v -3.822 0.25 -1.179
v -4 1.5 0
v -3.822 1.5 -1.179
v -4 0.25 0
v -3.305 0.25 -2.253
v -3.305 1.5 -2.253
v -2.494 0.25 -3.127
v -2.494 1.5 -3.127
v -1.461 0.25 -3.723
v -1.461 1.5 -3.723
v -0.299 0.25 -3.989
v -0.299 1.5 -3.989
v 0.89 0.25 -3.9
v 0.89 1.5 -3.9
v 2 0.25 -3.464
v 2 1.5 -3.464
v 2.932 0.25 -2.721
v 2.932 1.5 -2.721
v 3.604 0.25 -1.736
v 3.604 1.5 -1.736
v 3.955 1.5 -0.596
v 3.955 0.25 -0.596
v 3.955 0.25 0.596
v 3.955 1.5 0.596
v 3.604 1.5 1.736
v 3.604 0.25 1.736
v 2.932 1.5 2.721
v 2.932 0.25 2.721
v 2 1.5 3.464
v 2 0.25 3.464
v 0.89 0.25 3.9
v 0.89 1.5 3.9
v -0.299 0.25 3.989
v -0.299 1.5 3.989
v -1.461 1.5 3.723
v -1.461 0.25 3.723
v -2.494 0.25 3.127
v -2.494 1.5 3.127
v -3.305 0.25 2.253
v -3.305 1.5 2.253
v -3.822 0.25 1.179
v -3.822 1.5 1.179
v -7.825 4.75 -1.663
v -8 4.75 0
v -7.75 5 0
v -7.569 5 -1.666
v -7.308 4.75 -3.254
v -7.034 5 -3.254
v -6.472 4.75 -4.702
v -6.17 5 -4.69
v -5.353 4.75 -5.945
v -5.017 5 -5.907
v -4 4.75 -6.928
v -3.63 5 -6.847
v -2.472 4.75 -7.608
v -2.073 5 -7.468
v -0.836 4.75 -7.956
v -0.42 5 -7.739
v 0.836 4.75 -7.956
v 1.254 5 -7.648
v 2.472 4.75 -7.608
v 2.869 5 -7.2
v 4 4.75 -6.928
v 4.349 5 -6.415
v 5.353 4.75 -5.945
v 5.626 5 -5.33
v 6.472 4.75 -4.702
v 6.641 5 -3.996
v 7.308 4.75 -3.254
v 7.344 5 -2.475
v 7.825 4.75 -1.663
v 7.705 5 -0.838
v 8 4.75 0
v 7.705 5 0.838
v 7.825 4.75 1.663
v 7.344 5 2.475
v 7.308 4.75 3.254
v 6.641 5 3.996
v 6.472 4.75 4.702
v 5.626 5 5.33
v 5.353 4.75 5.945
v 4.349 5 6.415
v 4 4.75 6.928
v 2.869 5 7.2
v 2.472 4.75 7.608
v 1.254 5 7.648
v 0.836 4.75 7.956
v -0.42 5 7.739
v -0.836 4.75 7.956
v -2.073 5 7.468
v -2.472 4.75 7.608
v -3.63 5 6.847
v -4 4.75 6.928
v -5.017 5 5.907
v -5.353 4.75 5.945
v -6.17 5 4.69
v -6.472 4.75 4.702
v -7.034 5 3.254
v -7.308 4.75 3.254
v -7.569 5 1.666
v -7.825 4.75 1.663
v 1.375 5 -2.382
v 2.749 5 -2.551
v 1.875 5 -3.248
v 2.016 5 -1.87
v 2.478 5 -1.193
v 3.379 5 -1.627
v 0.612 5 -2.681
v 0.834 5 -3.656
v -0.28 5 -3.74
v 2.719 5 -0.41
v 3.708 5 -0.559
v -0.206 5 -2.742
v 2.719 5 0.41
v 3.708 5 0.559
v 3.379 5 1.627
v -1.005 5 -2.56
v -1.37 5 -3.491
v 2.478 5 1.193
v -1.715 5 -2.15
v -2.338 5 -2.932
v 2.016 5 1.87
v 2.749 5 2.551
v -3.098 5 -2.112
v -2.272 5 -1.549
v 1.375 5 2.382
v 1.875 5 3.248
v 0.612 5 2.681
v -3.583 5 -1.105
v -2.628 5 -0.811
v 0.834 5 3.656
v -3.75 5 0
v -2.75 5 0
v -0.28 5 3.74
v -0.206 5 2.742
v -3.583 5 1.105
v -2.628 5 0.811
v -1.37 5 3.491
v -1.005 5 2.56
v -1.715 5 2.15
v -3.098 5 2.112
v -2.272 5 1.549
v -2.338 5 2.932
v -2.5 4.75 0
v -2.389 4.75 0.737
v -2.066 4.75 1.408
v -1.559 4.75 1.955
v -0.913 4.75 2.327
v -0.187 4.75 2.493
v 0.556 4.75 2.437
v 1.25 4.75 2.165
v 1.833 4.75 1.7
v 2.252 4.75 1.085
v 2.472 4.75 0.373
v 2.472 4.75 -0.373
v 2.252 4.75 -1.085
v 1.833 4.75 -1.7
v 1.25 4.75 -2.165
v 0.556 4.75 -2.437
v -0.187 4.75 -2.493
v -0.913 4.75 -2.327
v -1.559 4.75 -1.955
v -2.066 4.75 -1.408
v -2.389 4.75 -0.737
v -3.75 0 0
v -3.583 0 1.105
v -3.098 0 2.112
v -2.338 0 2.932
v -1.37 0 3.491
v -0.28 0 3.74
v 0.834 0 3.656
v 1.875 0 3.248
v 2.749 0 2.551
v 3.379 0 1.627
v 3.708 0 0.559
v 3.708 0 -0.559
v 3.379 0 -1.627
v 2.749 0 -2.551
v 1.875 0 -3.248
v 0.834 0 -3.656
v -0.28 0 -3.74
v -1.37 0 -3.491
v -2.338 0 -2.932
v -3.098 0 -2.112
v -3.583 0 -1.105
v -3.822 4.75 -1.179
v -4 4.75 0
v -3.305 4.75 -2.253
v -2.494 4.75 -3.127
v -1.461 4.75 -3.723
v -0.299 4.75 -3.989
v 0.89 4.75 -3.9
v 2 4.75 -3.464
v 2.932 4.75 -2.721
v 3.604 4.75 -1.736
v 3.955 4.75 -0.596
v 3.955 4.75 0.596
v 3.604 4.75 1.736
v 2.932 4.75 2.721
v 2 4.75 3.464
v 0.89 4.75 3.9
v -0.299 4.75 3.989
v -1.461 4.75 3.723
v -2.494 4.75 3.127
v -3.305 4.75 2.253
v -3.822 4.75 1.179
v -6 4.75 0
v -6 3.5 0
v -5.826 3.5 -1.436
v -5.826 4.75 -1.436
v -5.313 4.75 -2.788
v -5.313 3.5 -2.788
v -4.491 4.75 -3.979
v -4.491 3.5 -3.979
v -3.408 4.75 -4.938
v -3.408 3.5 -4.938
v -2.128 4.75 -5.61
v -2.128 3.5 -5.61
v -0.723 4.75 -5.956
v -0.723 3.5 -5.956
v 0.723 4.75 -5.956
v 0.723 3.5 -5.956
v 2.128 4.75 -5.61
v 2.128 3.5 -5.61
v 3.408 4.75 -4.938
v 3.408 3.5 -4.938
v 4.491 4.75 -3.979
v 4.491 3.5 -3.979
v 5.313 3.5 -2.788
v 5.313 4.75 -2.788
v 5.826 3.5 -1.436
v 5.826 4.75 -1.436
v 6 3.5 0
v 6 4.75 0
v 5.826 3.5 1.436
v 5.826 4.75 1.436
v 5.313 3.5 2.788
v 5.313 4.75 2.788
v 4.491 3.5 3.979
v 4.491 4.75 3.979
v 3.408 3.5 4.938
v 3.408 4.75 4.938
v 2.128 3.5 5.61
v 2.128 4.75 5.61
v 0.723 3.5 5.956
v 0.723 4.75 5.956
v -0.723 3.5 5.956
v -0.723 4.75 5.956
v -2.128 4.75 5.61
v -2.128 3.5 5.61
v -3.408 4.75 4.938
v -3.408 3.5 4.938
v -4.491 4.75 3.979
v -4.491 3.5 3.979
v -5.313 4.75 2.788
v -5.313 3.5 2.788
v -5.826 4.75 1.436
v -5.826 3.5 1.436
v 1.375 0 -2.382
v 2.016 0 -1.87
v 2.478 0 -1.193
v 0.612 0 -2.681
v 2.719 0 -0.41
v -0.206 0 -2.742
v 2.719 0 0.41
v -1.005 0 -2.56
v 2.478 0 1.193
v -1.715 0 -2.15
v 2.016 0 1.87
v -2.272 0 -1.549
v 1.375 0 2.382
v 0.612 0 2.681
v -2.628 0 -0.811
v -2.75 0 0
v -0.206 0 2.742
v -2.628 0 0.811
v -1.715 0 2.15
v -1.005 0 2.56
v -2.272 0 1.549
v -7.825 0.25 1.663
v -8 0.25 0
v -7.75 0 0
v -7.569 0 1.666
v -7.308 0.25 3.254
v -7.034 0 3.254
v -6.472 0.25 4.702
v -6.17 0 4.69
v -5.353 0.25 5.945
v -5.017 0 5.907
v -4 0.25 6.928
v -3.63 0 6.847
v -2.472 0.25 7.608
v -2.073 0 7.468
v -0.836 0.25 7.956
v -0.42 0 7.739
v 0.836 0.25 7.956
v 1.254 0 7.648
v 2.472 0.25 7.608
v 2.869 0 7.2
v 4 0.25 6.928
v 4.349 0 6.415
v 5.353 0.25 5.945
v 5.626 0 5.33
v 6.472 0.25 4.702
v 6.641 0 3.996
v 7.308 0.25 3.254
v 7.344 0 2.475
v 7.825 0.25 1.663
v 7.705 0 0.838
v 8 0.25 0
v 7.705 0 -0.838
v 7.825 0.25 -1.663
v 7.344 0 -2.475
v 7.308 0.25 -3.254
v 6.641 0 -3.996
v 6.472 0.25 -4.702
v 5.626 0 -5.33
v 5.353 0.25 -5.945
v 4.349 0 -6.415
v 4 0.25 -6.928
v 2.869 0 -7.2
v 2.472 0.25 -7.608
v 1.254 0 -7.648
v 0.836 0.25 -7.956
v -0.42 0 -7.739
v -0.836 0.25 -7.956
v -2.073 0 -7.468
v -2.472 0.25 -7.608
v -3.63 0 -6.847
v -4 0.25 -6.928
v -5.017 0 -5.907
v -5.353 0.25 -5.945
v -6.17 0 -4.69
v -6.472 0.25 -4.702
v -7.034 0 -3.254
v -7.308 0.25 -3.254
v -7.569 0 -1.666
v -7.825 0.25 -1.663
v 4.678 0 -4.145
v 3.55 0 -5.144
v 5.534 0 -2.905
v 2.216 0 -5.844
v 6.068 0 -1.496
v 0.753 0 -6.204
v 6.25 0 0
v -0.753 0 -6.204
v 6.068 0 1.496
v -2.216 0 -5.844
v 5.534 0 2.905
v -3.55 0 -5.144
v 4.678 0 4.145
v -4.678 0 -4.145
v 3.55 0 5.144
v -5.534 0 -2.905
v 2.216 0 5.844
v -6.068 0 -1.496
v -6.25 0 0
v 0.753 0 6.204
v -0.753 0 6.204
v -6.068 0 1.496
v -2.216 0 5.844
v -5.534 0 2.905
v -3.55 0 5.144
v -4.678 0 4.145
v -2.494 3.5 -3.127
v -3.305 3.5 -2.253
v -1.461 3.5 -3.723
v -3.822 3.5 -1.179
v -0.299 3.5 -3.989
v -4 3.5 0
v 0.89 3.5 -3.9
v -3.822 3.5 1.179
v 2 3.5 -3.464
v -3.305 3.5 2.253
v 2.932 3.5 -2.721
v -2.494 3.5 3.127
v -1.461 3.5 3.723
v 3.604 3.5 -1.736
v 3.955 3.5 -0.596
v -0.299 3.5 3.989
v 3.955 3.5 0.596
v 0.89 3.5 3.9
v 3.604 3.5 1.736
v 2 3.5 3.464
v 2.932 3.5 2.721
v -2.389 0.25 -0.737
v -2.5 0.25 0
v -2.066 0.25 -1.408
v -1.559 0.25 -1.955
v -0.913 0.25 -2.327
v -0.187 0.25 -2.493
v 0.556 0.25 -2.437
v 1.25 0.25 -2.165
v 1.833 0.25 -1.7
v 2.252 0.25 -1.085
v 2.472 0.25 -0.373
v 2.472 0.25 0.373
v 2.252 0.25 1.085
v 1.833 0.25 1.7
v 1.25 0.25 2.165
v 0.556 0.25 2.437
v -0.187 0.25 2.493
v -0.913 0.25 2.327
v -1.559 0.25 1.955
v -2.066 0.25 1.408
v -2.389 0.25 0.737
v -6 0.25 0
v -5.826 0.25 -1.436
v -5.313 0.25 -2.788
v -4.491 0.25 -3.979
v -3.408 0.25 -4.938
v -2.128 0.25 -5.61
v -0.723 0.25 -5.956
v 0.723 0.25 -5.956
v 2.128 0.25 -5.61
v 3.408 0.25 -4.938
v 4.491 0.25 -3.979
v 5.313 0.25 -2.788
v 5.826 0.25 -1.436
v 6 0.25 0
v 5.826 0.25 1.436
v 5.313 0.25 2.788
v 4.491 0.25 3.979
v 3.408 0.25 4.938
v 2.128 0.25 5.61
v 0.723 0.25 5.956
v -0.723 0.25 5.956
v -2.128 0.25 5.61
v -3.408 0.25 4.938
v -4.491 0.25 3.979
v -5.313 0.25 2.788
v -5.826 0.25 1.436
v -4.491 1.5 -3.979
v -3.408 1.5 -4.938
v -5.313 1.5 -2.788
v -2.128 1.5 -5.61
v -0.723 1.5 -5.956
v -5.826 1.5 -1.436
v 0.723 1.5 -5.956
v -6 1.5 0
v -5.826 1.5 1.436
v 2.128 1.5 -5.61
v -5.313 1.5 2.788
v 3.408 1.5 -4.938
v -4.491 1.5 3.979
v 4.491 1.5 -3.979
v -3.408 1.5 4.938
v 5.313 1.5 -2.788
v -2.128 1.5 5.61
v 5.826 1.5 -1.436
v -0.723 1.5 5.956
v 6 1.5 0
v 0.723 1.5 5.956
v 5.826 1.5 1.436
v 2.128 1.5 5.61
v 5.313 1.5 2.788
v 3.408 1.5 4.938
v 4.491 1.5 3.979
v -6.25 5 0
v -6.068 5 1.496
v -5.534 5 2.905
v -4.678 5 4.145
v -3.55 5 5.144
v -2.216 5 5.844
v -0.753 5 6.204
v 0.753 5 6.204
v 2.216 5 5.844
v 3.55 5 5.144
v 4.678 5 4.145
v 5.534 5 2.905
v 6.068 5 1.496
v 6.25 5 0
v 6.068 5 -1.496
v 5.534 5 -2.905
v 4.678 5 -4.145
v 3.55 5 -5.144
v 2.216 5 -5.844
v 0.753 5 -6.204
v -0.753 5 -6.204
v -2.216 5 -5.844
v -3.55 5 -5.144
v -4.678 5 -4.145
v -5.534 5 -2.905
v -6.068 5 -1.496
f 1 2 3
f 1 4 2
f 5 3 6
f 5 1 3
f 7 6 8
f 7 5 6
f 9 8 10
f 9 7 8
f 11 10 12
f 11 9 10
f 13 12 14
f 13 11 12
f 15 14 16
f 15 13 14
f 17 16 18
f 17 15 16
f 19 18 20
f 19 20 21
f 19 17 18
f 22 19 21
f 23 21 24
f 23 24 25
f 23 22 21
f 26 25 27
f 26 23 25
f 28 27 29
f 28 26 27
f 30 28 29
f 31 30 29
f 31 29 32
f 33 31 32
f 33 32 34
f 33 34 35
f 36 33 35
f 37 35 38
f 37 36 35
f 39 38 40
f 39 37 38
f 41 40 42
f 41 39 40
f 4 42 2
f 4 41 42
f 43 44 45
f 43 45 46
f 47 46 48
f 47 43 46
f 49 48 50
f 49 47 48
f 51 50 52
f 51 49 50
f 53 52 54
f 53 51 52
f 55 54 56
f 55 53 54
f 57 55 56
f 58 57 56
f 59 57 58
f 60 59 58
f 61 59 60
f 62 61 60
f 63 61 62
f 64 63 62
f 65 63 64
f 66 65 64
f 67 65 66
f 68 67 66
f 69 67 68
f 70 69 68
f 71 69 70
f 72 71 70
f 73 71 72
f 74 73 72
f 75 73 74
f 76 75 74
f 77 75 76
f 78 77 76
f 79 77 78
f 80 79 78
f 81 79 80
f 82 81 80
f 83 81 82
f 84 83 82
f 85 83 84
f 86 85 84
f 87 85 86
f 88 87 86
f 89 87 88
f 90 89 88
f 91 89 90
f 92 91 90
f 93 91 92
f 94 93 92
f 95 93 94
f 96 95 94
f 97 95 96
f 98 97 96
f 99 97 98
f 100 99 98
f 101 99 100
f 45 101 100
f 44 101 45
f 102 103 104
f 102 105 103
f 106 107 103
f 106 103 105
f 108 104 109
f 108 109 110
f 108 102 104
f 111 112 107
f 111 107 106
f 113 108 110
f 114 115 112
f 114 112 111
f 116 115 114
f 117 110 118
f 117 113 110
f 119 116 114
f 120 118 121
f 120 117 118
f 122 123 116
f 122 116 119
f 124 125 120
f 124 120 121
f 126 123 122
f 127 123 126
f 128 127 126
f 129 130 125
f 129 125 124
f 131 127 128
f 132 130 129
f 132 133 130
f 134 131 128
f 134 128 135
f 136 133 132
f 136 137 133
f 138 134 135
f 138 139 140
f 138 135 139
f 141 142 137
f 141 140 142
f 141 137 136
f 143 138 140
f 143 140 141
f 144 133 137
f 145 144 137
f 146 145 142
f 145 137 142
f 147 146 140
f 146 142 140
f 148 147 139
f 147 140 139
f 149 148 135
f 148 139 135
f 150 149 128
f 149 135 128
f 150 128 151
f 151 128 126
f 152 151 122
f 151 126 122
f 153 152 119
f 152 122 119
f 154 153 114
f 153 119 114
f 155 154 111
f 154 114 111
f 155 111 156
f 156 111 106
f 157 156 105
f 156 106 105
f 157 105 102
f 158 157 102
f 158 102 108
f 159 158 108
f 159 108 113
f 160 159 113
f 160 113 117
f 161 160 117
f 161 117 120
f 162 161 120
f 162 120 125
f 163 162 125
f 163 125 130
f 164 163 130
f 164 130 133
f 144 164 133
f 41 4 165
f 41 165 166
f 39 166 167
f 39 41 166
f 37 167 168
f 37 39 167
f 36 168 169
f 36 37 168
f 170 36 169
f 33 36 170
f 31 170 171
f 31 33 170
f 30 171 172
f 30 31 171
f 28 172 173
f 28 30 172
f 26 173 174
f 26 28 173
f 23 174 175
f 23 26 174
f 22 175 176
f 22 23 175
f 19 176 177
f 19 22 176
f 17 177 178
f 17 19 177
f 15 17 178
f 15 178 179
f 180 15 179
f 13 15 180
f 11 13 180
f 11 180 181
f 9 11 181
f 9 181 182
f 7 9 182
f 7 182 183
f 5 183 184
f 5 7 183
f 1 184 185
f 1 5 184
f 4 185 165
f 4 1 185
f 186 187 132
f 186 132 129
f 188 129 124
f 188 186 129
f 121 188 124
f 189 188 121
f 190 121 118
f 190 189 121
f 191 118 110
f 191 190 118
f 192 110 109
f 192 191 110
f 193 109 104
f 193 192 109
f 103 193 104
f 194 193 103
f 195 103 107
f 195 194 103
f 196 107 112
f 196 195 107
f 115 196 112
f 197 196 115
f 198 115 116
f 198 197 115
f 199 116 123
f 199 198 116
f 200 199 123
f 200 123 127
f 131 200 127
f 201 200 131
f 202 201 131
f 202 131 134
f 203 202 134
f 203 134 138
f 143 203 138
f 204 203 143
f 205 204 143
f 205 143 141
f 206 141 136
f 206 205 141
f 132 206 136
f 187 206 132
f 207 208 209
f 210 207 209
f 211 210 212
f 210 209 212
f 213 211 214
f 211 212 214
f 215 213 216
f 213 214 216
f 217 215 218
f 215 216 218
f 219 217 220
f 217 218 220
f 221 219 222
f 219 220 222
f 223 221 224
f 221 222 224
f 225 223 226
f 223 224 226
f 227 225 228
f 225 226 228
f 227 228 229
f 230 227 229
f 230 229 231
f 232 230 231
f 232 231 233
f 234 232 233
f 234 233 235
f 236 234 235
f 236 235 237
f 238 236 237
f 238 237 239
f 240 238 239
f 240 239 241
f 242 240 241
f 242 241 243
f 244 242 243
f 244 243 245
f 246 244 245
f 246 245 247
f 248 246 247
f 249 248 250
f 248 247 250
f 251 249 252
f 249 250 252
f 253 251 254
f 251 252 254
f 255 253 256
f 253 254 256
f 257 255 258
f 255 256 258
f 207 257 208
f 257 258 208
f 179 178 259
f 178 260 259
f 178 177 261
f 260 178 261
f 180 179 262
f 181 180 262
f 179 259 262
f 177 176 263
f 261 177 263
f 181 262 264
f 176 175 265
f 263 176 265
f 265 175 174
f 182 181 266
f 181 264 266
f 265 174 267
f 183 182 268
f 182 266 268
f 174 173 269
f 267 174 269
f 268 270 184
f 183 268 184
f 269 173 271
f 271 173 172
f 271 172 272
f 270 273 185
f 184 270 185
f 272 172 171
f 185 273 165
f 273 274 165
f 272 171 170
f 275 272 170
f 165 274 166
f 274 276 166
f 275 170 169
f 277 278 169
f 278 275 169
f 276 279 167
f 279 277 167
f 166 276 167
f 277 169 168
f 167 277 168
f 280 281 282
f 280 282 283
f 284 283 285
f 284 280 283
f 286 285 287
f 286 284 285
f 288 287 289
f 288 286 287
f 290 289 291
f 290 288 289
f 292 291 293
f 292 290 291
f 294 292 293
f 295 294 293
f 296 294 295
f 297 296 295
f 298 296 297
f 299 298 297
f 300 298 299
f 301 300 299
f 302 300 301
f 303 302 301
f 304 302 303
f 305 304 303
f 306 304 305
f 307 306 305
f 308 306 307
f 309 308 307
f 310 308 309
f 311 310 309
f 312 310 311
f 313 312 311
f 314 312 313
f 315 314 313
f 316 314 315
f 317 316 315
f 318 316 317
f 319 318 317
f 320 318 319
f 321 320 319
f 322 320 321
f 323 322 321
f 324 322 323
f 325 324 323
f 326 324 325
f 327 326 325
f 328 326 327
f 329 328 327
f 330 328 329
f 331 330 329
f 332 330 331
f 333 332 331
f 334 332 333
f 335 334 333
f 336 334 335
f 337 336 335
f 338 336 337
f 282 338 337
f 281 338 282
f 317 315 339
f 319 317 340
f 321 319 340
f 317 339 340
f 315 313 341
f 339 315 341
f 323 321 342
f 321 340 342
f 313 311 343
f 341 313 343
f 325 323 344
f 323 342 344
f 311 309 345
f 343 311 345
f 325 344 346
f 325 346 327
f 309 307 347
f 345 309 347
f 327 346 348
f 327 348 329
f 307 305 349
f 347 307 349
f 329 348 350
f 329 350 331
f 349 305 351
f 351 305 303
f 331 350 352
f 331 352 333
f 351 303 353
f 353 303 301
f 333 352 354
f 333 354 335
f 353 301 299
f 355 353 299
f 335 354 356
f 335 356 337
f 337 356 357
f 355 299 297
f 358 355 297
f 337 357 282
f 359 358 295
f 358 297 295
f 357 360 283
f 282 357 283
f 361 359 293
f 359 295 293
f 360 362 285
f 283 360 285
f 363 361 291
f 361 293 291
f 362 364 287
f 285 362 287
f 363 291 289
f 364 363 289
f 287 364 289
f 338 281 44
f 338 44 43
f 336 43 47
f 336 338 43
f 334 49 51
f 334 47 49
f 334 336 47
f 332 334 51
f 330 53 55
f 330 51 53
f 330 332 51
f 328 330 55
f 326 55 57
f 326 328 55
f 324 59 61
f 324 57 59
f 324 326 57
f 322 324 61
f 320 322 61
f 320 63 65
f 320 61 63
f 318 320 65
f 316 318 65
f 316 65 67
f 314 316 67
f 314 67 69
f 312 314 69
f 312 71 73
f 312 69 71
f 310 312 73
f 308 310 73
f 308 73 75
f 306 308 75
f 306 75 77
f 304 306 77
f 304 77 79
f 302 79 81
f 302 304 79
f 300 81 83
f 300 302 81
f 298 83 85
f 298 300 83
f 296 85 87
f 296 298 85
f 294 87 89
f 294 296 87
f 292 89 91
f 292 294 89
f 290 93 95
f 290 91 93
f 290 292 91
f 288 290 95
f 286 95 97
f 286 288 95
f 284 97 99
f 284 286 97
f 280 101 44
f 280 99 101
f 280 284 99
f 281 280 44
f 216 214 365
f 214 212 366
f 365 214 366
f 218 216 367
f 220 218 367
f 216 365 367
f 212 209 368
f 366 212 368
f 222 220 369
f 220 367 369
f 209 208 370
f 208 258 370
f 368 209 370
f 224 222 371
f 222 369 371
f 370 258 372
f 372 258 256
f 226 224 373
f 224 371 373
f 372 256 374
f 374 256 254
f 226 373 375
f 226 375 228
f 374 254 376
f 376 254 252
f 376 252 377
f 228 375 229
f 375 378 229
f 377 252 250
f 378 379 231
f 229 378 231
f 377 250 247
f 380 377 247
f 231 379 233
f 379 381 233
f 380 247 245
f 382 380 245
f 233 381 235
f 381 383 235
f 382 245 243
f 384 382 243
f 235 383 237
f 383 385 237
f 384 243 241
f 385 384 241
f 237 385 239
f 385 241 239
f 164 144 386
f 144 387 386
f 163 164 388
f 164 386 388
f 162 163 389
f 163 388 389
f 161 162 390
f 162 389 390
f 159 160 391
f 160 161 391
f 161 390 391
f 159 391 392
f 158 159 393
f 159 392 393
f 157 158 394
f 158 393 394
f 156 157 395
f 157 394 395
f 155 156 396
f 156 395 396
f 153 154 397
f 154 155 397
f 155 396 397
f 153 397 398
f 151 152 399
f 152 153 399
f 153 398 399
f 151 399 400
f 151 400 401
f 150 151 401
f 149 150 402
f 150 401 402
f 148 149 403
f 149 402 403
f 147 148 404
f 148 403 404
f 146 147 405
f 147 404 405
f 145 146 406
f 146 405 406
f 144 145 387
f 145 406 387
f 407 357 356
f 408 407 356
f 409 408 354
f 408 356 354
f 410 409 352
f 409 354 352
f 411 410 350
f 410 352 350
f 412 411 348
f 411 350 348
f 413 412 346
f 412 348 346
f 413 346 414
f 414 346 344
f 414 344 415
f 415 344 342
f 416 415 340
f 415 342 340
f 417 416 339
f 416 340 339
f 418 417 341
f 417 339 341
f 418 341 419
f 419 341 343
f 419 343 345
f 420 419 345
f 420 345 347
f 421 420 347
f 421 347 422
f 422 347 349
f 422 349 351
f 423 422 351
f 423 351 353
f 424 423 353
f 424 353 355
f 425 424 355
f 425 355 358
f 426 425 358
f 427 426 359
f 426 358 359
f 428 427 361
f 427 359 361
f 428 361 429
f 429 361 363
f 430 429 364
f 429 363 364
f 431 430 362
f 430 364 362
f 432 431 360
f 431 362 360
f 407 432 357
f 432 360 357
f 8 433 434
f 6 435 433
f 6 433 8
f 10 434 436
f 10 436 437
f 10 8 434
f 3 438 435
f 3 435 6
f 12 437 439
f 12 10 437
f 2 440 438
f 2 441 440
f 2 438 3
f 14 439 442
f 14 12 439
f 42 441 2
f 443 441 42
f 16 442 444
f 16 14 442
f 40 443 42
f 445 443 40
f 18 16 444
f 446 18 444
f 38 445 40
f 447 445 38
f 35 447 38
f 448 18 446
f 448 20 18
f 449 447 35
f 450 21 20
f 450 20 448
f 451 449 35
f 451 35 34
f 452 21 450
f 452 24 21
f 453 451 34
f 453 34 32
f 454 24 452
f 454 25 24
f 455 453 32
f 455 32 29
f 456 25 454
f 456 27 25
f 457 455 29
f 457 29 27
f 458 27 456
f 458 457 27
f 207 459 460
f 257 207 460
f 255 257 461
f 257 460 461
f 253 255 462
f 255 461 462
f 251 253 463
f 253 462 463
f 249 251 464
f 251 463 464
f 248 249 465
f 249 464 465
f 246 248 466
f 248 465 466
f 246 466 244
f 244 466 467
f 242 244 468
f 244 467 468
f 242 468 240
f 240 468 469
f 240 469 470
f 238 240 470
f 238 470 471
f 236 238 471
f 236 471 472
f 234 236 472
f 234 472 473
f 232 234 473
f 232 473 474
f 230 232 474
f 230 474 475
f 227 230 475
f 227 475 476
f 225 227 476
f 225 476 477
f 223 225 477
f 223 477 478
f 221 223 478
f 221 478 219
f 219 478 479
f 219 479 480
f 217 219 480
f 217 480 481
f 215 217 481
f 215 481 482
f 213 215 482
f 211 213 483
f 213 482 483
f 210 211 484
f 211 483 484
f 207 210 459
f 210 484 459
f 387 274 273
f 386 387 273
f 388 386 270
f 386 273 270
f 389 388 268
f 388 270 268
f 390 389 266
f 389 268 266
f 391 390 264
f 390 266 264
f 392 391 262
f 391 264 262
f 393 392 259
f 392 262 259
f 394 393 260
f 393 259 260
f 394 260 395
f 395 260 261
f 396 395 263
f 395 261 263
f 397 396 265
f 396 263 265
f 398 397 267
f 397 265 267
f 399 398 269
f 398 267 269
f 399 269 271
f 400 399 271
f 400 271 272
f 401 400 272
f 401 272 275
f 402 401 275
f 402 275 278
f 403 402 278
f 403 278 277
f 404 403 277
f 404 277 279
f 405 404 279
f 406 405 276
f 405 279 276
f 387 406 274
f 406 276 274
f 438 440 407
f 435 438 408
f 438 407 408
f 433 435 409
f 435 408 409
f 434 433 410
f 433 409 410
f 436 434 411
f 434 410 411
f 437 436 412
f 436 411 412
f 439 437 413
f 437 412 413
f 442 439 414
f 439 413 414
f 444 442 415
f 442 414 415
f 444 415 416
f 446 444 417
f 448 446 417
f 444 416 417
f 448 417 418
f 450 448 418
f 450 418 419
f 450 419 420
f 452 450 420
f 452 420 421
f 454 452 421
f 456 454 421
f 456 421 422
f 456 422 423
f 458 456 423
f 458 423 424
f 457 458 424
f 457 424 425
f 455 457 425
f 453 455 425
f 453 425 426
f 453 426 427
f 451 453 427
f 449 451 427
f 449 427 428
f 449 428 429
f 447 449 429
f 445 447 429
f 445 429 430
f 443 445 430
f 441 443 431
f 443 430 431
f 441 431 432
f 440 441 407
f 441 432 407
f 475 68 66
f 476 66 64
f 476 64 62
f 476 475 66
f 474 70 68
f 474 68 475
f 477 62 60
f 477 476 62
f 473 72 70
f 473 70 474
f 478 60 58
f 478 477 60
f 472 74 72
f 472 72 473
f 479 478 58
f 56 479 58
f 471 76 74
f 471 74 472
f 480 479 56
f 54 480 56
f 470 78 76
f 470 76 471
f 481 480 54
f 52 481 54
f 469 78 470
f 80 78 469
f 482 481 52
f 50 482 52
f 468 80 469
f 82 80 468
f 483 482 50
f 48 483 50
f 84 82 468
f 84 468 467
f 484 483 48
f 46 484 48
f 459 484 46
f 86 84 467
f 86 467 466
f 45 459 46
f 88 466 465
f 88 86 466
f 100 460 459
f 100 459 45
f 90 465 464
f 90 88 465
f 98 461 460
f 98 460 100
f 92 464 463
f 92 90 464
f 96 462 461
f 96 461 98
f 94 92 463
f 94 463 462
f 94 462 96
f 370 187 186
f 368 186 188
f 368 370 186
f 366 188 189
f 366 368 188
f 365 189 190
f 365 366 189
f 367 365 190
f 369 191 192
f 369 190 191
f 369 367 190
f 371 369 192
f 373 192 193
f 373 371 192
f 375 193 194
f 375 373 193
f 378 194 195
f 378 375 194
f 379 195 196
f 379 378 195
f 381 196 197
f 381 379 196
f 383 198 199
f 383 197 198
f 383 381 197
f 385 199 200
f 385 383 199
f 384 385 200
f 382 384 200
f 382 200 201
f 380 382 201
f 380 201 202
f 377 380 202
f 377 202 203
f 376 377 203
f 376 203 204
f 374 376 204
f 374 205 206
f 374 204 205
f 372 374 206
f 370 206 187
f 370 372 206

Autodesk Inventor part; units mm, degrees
ref_plane "YZ Plane" through (0, 0, 0) normal (1, 0, 0) x (0, 1, 0)
ref_plane "XZ Plane" through (0, 0, 0) normal (0, 1, 0) x (-1, 0, 0)
sketch "Эскиз1" plane through (0, 0, 0) normal (0, 1, 0) x (-1, 0, 0)
  circle A0 centre (0, 0) radius 8
  circle A1 centre (0, 0) radius 2.5
  circle A2 centre (0, 0) radius 4
  circle A3 centre (0, 0) radius 6
  dimension "d0" = 16
  dimension "d1" = 5
  dimension "d2" = 8
  dimension "d3" = 12
extrude "Выдавливание1" add sketch "Эскиз1" along normal blind 5
chamfer "Фаска1" distance 0.25 angle 45 8 edges at (8, 0, 0) (8, 5, 0) (6, 5, 0) (2.5, 0, 0) (2.5, 5, 0) (4, 5, 0) (4, 0, 0) (6, 0, 0)
ref_plane "РабПлоскость1" through (0, 1.5, 0) normal (0, -1, 0) x (1, 0, 0)
sketch "Эскиз2" plane through (0, 1.5, 0) normal (0, -1, 0) x (1, 0, 0)
  circle A0 centre (0, 0) radius 6.25 projected
  circle A1 centre (0, 0) radius 6.7619
  circle A2 centre (0, 0) radius 3.4801
extrude "Выдавливание2" add sketch "Эскиз2" against normal blind 2 contours A0
properties part number "625zz"
